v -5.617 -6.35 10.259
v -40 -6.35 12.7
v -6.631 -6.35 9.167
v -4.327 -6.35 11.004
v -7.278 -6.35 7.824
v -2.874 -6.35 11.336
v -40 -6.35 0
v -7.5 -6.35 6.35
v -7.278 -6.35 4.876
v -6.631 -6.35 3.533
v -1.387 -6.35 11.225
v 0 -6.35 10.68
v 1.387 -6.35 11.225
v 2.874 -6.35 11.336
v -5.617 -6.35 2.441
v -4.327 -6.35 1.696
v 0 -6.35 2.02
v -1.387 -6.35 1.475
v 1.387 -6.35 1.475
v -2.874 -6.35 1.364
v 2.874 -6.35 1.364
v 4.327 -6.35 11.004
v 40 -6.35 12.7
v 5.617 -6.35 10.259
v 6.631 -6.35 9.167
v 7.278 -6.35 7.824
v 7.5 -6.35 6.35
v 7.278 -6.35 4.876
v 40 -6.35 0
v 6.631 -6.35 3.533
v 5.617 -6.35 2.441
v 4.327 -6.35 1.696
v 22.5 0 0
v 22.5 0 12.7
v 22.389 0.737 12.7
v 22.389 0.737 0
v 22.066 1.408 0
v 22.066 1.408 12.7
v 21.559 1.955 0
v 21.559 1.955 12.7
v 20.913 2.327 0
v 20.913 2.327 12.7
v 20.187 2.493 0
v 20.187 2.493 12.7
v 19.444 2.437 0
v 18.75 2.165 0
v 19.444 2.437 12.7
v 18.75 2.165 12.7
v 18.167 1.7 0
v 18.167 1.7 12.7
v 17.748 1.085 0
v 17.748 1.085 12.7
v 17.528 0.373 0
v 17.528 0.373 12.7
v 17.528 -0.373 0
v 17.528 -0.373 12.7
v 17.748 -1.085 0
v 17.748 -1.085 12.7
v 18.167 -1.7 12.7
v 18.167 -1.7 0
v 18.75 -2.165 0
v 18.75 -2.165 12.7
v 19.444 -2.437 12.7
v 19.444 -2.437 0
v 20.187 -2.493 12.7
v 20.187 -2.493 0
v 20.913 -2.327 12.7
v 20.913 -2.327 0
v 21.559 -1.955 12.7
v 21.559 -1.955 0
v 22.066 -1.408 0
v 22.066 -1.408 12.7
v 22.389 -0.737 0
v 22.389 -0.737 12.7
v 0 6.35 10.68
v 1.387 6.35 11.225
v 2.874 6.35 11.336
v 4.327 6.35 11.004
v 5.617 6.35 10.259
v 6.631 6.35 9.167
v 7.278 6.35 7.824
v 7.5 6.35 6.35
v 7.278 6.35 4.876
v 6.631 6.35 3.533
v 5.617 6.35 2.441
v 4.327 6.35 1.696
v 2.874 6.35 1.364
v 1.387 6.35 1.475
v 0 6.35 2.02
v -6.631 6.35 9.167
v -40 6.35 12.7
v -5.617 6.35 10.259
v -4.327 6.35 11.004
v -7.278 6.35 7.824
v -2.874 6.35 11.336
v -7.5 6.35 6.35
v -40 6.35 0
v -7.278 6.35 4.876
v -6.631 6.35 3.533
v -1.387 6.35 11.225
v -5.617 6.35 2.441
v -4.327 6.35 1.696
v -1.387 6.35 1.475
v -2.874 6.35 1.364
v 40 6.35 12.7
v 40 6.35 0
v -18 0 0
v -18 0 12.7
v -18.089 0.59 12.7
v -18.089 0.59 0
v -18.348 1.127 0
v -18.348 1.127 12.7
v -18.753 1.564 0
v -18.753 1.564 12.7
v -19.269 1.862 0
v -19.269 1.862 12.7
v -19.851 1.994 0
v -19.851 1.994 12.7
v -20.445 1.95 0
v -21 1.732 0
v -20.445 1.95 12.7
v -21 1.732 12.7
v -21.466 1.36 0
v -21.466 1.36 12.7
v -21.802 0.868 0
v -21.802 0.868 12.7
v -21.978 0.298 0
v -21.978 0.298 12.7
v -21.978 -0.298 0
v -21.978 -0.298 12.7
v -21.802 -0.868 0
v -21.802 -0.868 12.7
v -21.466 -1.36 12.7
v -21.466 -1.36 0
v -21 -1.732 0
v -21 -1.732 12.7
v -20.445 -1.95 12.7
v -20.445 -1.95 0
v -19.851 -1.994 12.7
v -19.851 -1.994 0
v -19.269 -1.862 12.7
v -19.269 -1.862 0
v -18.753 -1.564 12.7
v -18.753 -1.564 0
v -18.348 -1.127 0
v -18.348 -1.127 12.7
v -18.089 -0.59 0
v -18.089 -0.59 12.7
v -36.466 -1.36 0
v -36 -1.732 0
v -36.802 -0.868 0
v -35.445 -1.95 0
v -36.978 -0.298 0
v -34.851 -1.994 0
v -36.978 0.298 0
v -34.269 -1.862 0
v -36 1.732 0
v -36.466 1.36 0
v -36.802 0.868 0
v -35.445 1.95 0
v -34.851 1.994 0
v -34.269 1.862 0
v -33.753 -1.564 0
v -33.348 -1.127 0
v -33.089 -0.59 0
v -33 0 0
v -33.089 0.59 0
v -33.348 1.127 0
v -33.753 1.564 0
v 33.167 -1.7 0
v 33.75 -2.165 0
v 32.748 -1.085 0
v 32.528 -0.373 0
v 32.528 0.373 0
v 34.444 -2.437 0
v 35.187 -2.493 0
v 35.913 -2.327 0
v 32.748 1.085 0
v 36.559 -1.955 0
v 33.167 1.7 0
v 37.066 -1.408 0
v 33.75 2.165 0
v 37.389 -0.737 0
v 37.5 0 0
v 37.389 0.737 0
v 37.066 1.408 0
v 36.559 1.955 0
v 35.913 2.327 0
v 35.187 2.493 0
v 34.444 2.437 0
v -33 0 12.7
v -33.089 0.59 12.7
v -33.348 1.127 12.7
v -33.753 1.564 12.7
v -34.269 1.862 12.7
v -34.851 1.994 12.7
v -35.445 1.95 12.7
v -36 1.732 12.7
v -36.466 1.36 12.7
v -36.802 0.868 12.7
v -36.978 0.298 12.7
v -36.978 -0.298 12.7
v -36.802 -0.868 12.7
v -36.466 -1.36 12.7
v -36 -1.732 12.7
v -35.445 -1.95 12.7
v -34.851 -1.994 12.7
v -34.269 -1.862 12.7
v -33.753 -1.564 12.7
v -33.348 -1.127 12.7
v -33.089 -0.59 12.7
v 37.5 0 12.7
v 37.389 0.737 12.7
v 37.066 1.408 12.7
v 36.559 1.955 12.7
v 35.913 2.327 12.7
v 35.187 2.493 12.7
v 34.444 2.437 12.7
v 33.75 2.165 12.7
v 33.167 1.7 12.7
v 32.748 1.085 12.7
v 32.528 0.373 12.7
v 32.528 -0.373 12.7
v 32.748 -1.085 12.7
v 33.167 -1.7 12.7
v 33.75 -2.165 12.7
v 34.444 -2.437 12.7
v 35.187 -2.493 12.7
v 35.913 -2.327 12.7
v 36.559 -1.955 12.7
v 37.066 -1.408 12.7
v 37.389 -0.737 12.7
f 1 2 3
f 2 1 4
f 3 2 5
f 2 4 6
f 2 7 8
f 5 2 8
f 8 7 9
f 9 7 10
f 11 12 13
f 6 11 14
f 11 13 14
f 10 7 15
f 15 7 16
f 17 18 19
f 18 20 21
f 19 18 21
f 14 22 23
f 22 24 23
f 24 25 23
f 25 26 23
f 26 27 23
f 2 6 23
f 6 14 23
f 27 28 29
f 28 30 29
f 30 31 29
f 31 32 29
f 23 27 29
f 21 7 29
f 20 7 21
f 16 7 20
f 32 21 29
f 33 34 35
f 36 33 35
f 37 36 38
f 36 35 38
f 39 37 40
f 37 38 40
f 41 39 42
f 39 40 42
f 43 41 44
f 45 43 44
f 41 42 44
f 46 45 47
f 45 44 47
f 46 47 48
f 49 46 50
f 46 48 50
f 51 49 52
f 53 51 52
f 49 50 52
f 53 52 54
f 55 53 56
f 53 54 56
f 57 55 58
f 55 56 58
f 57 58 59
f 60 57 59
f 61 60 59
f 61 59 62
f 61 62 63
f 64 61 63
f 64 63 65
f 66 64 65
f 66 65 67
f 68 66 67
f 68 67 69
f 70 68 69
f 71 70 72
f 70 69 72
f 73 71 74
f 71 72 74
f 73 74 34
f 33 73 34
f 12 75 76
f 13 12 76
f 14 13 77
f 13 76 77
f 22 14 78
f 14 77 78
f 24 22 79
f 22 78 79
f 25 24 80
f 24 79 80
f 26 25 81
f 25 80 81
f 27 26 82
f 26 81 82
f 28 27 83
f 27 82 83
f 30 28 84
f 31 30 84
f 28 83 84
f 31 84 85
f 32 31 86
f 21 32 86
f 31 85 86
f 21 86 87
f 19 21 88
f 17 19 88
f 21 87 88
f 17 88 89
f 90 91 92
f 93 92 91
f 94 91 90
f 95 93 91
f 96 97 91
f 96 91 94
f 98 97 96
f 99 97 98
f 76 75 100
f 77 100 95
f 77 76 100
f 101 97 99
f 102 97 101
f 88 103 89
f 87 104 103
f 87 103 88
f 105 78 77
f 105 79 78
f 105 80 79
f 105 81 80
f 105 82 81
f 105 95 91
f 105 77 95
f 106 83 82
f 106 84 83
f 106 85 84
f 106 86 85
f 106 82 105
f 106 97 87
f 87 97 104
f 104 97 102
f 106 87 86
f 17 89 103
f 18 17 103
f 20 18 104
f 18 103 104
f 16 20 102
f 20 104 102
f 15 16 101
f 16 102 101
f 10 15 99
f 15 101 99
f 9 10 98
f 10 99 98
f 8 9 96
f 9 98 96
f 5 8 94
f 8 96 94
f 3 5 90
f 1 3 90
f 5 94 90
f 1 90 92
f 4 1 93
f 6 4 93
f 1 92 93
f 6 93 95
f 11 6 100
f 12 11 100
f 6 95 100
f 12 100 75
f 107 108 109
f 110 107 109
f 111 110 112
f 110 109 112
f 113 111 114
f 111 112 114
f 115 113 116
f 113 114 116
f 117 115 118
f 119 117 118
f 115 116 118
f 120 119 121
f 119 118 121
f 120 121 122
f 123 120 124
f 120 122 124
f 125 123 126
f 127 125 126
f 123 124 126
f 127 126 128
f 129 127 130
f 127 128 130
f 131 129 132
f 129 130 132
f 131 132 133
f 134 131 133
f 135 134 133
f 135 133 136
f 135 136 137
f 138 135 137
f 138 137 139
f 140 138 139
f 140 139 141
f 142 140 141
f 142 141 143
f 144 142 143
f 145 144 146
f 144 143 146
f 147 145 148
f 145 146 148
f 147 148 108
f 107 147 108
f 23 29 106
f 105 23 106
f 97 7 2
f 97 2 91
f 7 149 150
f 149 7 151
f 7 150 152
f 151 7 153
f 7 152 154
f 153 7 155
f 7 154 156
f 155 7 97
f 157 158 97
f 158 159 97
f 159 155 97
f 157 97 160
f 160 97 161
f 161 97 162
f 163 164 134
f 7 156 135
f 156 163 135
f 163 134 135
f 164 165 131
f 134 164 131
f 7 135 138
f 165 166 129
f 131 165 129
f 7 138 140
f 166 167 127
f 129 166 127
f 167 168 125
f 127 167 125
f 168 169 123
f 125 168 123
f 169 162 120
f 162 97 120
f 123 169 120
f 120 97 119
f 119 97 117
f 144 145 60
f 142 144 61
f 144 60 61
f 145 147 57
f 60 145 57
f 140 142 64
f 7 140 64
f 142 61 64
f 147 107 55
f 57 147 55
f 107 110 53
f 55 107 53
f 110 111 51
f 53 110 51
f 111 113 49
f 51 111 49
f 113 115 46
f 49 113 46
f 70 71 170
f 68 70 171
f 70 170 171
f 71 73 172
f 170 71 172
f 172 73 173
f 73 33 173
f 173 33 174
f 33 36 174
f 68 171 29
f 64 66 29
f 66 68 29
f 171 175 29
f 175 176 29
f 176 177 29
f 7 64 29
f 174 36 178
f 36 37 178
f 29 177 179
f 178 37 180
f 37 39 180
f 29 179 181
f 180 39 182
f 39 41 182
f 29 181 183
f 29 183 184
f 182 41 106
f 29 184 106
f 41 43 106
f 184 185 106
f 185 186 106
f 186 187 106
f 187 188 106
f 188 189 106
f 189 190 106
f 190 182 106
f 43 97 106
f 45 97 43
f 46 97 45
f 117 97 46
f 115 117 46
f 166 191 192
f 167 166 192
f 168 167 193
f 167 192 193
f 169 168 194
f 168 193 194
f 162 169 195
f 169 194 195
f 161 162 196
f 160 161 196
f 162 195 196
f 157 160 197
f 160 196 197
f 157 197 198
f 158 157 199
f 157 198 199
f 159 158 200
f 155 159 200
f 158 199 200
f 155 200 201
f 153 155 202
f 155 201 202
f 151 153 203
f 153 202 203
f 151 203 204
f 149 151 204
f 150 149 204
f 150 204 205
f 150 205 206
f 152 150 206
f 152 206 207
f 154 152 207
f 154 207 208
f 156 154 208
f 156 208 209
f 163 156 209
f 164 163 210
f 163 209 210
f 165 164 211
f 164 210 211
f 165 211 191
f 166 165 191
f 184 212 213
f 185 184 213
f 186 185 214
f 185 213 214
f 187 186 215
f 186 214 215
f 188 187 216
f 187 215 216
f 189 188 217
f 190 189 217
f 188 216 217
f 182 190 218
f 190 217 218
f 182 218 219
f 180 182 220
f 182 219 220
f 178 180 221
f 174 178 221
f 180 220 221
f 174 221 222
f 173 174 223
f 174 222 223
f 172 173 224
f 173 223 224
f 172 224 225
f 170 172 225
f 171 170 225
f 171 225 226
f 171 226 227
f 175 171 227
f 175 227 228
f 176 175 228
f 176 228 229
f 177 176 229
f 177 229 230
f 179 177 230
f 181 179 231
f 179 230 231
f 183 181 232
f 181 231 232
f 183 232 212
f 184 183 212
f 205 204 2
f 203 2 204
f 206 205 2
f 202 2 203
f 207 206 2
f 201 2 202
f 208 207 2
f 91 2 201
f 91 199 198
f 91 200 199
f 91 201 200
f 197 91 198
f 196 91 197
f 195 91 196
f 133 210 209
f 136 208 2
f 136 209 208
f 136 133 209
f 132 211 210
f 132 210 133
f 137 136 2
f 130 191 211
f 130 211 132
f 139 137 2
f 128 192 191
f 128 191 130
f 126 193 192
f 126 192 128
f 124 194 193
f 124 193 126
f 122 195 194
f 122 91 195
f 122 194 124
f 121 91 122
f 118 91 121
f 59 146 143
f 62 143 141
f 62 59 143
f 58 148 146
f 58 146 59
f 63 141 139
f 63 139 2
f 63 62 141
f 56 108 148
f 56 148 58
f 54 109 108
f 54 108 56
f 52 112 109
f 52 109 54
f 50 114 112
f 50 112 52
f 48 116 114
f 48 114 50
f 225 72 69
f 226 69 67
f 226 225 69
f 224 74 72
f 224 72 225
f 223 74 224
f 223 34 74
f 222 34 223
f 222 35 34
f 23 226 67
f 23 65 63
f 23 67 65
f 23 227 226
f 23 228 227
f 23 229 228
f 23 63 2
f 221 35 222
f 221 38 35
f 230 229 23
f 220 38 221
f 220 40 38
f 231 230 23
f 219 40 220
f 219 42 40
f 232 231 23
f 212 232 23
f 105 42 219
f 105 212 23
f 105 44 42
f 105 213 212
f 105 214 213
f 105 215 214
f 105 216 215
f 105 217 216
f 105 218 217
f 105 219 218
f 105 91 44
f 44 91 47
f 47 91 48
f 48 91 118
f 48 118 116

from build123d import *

# Parameters (mm, degrees)
IZIM1_W                     = 80
IZIM1_H                     = 12.7
Y_KSEKLIK_EKSTR_ZYON1_DEPTH = 12.7
IZIM2_R                     = 2.5
IZIM2_R_2                   = 2
KES_EKSTR_ZYON1_DEPTH       = 12.7
KES_EKSTR_ZYON2_DEPTH       = 19.7


with BuildPart() as part:
    # Çizim1 → Yükseklik-Ekstrüzyon1 (new body)
    with BuildSketch(Plane.XY):
        Rectangle(IZIM1_W, IZIM1_H)
    extrude(amount=Y_KSEKLIK_EKSTR_ZYON1_DEPTH)

    # Çizim2 → Kes-Ekstrüzyon1 (cut)
    with BuildSketch(Plane.XY.offset(12.7)):
        with Locations((35, 0)):
            Circle(IZIM2_R)
        with Locations((20, 0)):
            Circle(IZIM2_R)
        with Locations((-35, 0)):
            Circle(IZIM2_R_2)
        with Locations((-20, 0)):
            Circle(IZIM2_R_2)
    extrude(amount=-KES_EKSTR_ZYON1_DEPTH, mode=Mode.SUBTRACT)

    # Çizim3 → Kes-Ekstrüzyon2 (cut)
    with BuildSketch(Plane(origin=(0, 6.35, 0), x_dir=(1, 0, 0), z_dir=(0, 1, 0))):
        with BuildLine():
            ThreePointArc((0, -2.019872981), (-7.5, -6.35), (0, -10.680127019))
            ThreePointArc((0, -10.680127019), (7.5, -6.35), (0, -2.019872981))
        make_face()
    extrude(amount=-KES_EKSTR_ZYON2_DEPTH, mode=Mode.SUBTRACT)


solid = part.part
